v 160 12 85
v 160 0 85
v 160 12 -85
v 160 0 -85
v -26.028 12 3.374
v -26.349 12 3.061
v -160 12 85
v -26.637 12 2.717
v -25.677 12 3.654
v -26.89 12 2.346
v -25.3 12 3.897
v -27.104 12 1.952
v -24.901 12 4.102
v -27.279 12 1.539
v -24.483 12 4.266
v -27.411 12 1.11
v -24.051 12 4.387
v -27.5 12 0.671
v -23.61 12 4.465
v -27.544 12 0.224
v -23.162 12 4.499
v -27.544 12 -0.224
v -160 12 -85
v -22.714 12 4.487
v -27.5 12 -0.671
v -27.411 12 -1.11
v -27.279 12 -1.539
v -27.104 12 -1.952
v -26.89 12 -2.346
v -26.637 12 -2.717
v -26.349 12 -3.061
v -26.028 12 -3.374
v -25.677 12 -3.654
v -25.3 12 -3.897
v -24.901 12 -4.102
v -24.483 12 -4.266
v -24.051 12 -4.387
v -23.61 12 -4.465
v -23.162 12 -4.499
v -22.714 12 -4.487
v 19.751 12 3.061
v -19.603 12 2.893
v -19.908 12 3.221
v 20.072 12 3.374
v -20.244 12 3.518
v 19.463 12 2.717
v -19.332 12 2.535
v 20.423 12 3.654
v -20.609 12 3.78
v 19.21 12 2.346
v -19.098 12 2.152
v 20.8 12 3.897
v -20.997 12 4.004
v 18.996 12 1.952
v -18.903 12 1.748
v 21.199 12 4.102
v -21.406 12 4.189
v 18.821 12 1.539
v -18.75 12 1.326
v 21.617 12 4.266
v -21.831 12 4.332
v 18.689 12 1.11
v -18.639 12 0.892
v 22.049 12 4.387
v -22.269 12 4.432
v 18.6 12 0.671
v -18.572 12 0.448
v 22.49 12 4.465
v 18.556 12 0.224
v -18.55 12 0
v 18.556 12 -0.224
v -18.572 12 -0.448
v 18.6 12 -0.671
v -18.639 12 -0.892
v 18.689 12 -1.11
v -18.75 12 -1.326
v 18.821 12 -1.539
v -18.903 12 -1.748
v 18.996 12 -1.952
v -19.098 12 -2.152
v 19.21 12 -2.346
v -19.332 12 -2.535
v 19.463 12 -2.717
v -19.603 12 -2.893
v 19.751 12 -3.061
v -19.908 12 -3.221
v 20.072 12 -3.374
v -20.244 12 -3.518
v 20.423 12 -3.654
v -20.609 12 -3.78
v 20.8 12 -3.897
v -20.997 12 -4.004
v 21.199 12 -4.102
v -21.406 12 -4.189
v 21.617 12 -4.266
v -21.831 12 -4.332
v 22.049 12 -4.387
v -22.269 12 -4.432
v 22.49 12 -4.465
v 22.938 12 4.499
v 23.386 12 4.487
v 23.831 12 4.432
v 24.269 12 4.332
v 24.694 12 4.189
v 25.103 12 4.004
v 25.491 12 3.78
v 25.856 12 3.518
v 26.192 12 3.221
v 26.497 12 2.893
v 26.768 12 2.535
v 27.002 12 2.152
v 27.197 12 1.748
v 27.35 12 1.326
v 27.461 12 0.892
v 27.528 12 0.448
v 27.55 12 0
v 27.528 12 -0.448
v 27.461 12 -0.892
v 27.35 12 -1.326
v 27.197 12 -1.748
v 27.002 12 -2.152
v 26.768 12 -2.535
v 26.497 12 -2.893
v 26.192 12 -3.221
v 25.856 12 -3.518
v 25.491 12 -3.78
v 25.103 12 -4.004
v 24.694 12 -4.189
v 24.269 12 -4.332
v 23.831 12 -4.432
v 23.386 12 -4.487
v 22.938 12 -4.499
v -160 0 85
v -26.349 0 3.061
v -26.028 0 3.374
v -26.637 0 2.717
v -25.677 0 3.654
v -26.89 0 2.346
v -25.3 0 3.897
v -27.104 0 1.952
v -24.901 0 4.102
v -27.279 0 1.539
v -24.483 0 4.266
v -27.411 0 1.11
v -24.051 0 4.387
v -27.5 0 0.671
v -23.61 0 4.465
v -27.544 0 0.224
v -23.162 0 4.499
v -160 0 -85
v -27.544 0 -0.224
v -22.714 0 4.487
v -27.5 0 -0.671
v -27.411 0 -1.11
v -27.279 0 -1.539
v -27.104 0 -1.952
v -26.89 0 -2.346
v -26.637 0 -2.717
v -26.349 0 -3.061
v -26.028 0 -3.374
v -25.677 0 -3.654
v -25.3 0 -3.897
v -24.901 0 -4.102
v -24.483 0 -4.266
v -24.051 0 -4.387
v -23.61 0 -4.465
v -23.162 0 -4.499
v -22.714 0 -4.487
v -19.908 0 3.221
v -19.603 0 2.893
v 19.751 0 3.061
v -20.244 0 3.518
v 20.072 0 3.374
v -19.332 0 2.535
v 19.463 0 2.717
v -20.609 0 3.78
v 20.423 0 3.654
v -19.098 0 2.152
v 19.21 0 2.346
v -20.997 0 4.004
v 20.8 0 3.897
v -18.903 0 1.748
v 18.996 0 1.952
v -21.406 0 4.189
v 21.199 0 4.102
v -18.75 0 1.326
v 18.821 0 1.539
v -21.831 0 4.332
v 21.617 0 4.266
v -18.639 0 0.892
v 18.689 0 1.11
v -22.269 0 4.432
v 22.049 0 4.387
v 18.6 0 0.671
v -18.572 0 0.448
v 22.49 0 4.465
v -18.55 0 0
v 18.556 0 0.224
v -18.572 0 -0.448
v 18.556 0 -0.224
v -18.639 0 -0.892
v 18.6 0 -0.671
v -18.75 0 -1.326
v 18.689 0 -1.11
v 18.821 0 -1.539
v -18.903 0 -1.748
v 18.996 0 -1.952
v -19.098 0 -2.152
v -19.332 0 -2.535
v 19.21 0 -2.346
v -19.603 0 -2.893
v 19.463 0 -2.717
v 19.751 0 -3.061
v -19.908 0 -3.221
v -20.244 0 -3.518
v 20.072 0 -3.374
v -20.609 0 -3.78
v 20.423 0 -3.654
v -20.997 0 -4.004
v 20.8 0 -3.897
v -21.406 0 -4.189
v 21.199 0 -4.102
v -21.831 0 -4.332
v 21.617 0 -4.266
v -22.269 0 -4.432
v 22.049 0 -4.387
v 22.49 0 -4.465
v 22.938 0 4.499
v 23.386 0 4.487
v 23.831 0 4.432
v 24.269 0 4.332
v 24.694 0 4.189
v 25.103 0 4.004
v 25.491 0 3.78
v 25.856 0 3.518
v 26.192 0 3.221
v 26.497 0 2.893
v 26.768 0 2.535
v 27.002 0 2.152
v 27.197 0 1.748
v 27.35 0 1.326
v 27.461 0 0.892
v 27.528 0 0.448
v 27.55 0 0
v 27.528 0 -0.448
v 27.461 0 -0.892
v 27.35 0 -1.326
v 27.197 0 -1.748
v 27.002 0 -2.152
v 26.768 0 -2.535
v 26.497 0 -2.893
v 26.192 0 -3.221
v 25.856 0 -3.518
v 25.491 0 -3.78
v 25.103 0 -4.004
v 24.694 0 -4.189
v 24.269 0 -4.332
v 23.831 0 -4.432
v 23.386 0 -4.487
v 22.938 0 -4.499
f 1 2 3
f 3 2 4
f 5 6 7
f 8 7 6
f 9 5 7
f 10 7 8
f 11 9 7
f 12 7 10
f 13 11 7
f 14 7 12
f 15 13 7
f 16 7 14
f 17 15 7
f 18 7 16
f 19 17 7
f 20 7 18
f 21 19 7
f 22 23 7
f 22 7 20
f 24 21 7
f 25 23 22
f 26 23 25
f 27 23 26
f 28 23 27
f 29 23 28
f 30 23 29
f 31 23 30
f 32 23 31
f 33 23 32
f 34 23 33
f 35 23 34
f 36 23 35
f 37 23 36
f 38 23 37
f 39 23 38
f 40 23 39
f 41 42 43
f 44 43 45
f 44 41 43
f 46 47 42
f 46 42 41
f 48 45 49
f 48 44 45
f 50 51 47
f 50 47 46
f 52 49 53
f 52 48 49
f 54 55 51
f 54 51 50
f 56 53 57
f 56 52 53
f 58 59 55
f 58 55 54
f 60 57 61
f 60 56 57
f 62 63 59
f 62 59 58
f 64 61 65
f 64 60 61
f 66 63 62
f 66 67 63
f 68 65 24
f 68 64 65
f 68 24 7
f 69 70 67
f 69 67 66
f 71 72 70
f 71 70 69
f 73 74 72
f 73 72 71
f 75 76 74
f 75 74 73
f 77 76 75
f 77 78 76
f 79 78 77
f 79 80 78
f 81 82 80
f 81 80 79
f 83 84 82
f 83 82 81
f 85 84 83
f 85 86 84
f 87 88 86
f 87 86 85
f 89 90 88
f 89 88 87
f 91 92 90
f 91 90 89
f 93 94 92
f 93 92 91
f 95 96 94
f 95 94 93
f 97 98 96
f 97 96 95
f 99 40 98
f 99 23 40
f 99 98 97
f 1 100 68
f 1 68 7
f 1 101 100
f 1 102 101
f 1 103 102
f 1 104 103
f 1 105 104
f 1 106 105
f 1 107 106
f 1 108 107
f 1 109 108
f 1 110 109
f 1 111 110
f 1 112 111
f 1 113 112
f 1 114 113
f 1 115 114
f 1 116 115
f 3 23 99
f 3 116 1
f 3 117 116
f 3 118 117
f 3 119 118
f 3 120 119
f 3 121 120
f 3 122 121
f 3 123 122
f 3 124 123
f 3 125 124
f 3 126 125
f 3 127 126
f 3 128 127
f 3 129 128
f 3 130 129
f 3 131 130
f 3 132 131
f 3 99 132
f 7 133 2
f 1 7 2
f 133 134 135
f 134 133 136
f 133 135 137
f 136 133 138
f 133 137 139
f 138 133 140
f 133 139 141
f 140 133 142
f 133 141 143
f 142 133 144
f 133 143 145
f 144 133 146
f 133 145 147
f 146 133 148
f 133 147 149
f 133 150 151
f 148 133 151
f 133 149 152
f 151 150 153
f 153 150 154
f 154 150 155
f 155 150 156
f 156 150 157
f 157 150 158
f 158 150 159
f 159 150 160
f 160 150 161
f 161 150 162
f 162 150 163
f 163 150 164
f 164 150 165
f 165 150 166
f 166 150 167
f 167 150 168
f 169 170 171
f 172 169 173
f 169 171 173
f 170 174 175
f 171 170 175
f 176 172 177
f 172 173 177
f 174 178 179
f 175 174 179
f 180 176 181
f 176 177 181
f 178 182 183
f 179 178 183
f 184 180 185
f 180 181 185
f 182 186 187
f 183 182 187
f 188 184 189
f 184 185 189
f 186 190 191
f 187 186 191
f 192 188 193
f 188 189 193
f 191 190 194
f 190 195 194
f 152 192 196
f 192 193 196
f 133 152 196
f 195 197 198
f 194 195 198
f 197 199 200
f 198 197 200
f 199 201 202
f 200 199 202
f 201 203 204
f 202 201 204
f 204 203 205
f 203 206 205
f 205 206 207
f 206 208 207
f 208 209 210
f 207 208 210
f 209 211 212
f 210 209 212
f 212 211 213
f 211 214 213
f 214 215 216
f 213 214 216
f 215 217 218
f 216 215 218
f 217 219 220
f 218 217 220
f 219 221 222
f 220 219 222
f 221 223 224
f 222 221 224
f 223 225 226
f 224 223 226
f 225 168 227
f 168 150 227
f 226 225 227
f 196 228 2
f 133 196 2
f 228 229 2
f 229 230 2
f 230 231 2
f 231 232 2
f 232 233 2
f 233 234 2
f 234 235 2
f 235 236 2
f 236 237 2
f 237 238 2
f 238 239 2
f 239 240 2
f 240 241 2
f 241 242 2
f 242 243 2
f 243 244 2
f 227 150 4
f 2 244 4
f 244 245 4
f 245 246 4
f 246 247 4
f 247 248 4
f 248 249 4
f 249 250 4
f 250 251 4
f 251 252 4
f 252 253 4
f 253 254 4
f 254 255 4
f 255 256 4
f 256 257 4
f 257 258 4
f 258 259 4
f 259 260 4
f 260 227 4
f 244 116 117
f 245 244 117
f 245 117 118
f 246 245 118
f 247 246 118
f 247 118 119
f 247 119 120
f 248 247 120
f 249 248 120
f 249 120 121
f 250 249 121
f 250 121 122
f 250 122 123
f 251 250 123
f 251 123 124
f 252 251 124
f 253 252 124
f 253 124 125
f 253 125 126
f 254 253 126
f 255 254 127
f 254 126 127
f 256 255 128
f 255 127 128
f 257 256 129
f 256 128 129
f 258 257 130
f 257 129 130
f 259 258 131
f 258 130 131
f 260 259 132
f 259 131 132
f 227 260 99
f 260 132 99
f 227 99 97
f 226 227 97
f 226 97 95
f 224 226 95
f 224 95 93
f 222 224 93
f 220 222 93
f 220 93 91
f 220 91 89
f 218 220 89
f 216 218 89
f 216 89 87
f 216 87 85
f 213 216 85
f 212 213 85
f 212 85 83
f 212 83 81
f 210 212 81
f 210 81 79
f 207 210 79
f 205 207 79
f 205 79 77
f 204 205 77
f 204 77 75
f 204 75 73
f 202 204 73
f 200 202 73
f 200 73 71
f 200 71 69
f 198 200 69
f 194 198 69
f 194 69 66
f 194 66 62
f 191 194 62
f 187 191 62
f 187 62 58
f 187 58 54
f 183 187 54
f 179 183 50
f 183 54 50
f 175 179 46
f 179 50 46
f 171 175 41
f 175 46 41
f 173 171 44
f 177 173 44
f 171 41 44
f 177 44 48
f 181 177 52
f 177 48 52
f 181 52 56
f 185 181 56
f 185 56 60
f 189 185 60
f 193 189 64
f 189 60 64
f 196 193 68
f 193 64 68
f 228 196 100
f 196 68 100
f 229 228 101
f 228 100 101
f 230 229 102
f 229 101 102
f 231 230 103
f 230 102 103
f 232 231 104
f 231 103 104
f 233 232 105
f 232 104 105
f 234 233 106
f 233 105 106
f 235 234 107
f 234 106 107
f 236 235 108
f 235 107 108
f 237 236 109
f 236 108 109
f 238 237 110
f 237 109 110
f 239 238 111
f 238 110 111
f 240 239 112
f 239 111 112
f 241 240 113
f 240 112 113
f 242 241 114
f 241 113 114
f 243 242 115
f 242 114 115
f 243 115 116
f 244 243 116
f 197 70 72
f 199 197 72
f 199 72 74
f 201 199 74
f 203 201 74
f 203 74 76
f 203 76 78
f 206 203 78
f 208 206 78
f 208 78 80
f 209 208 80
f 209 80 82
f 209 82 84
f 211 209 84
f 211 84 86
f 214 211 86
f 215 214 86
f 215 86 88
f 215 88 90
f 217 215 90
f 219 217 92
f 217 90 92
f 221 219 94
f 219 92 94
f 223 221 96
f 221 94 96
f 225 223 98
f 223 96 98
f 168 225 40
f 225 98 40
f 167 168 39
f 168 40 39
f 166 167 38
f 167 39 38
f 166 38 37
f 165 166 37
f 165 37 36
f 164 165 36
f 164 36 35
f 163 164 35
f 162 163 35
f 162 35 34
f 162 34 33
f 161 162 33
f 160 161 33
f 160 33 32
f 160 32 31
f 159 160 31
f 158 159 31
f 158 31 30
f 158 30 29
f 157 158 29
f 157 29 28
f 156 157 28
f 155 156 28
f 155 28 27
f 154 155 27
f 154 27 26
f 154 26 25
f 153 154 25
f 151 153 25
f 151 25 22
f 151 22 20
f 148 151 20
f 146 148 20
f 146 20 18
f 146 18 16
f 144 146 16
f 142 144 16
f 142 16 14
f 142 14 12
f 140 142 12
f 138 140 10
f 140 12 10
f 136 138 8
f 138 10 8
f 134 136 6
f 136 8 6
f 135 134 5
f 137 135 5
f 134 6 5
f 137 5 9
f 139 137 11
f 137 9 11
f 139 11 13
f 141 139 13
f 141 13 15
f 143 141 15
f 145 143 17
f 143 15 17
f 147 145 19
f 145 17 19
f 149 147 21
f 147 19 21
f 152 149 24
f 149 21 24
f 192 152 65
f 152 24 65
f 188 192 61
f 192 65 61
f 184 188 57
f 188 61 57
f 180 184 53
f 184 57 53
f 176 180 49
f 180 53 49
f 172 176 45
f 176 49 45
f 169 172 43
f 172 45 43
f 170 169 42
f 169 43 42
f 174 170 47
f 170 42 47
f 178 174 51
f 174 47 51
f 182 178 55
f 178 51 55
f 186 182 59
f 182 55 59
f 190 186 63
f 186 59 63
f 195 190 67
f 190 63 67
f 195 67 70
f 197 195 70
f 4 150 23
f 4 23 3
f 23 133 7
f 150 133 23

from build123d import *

# Parameters (mm, degrees)
ESBO_O1_W                  = 320
ESBO_O1_H                  = 170
RESSALTO_EXTRUS_O1_DEPTH   = 12
ESBO_O2_R                  = 4.5
CORTE_EXTRUS_O1_DEPTH      = 1
CORTE_EXTRUS_O1_DEPTH_BACK = 13


with BuildPart() as part:
    # Esboço1 → Ressalto-extrusão1 (new body)
    with BuildSketch(Plane(origin=(0, 0, 0), x_dir=(1, 0, 0), z_dir=(0, 1, 0))):
        Rectangle(ESBO_O1_W, ESBO_O1_H)
    extrude(amount=RESSALTO_EXTRUS_O1_DEPTH)

    # Esboço2 → Corte-extrusão1 (cut, two sides)
    with BuildSketch(Plane(origin=(0, 12, 0), x_dir=(1, 0, 0), z_dir=(0, 1, 0))) as corte_extrus_o1_sk:
        with Locations((-23.05, 0)):
            Circle(ESBO_O2_R)
        with Locations((23.05, 0)):
            Circle(ESBO_O2_R)
    extrude(amount=CORTE_EXTRUS_O1_DEPTH, mode=Mode.SUBTRACT)
    extrude(corte_extrus_o1_sk.sketch, amount=-CORTE_EXTRUS_O1_DEPTH_BACK, mode=Mode.SUBTRACT)


solid = part.part
